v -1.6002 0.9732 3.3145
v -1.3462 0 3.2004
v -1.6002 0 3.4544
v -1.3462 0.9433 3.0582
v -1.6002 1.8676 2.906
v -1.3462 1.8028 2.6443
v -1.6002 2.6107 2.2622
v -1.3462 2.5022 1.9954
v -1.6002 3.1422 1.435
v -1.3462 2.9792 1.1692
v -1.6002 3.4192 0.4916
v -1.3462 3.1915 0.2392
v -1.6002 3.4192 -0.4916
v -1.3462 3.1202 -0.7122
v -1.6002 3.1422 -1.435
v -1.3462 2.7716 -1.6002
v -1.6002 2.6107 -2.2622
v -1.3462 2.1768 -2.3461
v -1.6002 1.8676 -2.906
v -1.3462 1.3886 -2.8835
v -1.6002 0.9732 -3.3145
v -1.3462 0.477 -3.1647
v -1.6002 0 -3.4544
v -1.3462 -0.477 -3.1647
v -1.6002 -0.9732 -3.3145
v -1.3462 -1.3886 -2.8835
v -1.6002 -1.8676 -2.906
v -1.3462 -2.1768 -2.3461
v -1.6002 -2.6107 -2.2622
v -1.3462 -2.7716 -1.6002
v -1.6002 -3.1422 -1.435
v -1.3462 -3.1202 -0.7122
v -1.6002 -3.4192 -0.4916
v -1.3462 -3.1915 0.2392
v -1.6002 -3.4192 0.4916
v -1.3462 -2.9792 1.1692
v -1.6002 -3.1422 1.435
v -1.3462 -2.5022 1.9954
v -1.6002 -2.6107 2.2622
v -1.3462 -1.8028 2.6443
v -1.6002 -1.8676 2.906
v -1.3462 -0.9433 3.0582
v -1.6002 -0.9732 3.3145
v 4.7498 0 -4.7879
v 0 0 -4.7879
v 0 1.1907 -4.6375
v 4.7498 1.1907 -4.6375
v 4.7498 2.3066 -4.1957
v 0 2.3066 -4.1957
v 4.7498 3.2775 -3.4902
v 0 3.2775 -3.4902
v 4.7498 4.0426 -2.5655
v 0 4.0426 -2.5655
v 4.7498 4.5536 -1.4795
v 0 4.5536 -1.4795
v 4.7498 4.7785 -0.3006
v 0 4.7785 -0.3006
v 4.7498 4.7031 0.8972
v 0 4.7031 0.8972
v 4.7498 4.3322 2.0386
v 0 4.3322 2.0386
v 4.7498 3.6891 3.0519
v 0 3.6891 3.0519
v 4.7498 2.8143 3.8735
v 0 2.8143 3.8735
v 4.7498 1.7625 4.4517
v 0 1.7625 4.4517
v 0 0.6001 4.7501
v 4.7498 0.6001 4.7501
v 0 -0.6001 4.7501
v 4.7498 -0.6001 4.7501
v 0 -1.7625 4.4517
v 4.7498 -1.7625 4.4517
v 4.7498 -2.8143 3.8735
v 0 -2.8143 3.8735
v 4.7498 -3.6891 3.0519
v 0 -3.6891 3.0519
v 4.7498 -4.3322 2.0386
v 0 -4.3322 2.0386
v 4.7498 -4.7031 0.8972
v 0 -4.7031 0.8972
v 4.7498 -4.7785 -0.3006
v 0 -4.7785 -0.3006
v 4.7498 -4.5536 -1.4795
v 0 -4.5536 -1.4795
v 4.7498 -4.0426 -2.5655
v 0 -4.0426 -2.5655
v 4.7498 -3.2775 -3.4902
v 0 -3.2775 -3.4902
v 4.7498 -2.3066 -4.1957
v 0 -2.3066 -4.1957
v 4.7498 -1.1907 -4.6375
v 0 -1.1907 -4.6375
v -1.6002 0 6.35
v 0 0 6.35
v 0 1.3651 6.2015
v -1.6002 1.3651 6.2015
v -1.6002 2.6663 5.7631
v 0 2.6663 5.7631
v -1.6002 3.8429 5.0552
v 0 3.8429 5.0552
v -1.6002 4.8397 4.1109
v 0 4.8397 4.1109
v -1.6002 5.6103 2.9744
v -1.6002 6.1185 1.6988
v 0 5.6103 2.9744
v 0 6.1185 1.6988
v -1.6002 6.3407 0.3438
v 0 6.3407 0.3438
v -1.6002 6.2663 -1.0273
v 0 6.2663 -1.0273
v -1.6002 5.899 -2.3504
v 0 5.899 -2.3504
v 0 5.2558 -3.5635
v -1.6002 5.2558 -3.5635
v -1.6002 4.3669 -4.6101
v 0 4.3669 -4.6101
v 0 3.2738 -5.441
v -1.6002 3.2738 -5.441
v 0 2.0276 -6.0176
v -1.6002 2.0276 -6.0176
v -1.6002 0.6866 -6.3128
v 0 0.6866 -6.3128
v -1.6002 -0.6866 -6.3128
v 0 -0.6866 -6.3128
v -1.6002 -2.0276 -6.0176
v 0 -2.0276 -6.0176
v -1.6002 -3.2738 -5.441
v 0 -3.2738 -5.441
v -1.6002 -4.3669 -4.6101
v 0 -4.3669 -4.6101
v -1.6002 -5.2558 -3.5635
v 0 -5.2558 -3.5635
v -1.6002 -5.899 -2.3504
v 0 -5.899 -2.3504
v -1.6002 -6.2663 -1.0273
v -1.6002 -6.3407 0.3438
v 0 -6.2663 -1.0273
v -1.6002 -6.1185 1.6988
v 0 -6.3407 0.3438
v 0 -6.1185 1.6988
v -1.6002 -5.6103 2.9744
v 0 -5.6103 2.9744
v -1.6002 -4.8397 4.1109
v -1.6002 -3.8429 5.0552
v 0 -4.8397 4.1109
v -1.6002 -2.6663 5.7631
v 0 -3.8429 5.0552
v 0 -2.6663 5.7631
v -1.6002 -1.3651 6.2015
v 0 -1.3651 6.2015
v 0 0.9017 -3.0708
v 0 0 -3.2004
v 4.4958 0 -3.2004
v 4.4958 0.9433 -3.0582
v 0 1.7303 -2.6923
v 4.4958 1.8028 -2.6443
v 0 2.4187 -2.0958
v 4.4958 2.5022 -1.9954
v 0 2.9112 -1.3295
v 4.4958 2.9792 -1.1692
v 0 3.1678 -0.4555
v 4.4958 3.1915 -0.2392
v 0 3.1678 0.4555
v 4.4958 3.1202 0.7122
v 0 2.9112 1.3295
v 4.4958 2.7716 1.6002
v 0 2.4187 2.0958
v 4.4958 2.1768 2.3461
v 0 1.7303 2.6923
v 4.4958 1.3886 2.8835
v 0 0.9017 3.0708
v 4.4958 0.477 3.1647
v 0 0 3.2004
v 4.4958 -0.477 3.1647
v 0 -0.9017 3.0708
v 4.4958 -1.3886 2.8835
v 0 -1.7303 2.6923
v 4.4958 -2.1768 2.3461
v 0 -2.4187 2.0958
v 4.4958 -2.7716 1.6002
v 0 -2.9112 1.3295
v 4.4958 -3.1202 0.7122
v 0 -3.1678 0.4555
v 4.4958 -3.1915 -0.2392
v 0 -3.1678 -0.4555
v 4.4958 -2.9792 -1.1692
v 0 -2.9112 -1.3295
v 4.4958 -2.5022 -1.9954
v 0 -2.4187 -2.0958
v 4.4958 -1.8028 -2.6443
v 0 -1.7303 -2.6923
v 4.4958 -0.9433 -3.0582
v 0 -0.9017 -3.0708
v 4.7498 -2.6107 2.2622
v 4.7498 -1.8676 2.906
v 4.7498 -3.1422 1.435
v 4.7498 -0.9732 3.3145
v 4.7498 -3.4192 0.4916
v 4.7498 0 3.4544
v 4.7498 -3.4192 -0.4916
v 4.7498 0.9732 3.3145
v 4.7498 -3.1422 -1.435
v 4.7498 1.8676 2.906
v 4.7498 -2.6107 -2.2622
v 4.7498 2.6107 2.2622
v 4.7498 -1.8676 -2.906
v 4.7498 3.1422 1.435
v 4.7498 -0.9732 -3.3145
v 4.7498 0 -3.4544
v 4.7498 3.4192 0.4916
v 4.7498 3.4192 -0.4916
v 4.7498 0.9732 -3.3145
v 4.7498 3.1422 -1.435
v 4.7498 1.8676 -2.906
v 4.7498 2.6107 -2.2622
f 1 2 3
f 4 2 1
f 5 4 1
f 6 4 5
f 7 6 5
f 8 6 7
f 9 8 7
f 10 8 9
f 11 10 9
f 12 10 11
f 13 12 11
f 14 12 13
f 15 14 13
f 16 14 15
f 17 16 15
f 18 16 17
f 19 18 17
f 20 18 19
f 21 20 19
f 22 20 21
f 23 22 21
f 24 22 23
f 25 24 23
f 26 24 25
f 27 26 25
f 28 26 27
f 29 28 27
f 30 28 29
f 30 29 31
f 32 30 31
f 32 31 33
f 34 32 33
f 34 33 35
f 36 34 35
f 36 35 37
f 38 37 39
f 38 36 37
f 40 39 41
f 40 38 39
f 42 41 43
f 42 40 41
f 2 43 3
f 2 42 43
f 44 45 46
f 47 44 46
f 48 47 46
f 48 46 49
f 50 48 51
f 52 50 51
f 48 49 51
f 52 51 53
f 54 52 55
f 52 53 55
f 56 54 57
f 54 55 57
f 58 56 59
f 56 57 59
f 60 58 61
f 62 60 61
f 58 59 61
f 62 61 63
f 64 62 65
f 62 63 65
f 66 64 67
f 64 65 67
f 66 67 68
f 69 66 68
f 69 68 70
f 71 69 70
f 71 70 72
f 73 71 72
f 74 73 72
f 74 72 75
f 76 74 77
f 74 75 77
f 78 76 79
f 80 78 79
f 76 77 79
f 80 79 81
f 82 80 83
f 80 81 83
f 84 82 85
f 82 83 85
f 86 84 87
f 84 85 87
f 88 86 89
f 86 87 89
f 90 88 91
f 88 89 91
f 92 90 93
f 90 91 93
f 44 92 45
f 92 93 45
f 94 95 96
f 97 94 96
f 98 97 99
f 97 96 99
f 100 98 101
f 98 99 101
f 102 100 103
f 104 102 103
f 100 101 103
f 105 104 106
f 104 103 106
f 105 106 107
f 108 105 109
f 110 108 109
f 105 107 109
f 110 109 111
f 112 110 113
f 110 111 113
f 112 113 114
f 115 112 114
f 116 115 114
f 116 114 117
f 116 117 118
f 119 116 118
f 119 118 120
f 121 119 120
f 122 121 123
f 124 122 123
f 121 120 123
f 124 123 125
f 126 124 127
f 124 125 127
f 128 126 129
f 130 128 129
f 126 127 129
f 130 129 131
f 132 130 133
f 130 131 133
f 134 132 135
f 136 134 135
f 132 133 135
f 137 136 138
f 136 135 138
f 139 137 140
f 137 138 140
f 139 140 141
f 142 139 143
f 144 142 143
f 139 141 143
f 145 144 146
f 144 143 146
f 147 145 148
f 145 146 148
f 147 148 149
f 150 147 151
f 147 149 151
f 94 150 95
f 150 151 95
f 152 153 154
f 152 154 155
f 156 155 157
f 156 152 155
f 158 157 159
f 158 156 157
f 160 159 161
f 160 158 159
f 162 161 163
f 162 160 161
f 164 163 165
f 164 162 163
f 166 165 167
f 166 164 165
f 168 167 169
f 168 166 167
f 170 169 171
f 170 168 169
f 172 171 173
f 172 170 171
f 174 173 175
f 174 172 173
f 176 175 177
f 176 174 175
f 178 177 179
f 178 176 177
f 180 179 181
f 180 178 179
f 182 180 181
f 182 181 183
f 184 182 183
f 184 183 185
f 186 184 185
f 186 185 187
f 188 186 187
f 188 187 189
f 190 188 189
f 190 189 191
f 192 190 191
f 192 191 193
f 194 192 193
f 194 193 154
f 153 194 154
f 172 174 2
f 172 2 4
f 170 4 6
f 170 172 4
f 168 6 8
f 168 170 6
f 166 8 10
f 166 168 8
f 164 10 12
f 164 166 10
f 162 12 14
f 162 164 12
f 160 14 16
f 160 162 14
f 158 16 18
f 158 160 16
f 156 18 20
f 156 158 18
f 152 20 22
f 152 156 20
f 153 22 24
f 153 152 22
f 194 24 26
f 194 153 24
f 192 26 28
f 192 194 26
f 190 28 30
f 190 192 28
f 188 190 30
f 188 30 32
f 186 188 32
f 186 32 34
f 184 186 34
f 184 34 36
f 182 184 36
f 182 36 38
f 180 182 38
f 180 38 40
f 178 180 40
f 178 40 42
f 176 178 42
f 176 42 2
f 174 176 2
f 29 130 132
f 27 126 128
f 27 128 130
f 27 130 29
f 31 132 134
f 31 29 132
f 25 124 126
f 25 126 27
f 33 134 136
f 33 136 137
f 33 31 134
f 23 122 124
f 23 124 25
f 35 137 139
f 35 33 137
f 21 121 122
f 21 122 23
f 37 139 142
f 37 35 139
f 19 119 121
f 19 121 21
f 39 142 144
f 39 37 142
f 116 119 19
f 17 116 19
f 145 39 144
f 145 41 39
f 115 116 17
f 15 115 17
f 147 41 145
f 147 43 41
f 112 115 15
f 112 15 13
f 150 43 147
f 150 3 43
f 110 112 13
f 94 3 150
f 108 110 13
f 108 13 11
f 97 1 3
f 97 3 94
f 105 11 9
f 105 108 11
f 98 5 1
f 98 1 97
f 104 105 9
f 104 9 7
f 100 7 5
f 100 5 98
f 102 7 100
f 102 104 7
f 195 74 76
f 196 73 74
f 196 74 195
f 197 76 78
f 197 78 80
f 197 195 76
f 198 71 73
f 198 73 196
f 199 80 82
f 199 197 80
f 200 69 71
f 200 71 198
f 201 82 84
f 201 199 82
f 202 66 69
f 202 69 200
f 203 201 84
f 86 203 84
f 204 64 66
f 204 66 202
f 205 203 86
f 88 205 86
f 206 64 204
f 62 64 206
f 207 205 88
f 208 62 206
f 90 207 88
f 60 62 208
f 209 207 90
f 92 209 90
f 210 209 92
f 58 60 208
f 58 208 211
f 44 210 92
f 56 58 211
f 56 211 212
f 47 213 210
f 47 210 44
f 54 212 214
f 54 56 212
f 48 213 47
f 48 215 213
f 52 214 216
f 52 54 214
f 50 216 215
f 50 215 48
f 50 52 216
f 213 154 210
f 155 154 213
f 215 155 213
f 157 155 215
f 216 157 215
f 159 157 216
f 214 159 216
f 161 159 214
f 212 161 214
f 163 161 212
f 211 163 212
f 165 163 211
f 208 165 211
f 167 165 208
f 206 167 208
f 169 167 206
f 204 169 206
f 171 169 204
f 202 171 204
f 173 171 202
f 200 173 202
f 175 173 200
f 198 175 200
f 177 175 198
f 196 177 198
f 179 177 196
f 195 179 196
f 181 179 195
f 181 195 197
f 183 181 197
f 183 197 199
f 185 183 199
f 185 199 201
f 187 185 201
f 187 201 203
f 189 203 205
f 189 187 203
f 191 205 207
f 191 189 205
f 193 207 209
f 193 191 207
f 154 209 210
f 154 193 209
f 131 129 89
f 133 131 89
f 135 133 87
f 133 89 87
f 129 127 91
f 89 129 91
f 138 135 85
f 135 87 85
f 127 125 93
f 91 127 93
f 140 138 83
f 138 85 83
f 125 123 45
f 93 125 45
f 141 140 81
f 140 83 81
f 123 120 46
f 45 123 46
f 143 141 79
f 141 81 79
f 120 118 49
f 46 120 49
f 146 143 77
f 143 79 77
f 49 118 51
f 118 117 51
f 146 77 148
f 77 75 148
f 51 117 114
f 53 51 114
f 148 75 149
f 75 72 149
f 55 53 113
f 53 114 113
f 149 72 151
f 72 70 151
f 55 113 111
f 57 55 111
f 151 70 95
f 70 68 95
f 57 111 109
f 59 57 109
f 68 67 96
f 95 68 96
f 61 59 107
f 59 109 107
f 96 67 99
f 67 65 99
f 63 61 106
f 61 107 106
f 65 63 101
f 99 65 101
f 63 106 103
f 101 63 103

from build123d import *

# Parameters (mm, degrees)
SKETCH1_R           = 4.7879
SKETCH1_R_2         = 3.2004
BOSS_EXTRUDE1_DEPTH = 4.7498
SKETCH2_R           = 6.35
SKETCH2_R_2         = 3.2004
BOSS_EXTRUDE2_DEPTH = 1.6002
CHAMFER1_SIZE       = 0.254


with BuildPart() as part:
    # Sketch1 → Boss-Extrude1 (new body)
    with BuildSketch(Plane(origin=(0, 0, 0), x_dir=(0, 0, -1), z_dir=(1, 0, 0))):
        Circle(SKETCH1_R)
        Circle(SKETCH1_R_2, mode=Mode.SUBTRACT)
    extrude(amount=BOSS_EXTRUDE1_DEPTH)

    # Sketch2 → Boss-Extrude2 (add)
    with BuildSketch(Plane.ZY):
        Circle(SKETCH2_R)
        Circle(SKETCH2_R_2, mode=Mode.SUBTRACT)
    extrude(amount=BOSS_EXTRUDE2_DEPTH)

    # Chamfer1
    chamfer1_edges = [part.edges().sort_by_distance(p)[0] for p in [
        (-1.6002, 0, -3.2004),
        (4.7498, 0, 3.2004),
    ]]
    chamfer(chamfer1_edges, length=CHAMFER1_SIZE)


solid = part.part
